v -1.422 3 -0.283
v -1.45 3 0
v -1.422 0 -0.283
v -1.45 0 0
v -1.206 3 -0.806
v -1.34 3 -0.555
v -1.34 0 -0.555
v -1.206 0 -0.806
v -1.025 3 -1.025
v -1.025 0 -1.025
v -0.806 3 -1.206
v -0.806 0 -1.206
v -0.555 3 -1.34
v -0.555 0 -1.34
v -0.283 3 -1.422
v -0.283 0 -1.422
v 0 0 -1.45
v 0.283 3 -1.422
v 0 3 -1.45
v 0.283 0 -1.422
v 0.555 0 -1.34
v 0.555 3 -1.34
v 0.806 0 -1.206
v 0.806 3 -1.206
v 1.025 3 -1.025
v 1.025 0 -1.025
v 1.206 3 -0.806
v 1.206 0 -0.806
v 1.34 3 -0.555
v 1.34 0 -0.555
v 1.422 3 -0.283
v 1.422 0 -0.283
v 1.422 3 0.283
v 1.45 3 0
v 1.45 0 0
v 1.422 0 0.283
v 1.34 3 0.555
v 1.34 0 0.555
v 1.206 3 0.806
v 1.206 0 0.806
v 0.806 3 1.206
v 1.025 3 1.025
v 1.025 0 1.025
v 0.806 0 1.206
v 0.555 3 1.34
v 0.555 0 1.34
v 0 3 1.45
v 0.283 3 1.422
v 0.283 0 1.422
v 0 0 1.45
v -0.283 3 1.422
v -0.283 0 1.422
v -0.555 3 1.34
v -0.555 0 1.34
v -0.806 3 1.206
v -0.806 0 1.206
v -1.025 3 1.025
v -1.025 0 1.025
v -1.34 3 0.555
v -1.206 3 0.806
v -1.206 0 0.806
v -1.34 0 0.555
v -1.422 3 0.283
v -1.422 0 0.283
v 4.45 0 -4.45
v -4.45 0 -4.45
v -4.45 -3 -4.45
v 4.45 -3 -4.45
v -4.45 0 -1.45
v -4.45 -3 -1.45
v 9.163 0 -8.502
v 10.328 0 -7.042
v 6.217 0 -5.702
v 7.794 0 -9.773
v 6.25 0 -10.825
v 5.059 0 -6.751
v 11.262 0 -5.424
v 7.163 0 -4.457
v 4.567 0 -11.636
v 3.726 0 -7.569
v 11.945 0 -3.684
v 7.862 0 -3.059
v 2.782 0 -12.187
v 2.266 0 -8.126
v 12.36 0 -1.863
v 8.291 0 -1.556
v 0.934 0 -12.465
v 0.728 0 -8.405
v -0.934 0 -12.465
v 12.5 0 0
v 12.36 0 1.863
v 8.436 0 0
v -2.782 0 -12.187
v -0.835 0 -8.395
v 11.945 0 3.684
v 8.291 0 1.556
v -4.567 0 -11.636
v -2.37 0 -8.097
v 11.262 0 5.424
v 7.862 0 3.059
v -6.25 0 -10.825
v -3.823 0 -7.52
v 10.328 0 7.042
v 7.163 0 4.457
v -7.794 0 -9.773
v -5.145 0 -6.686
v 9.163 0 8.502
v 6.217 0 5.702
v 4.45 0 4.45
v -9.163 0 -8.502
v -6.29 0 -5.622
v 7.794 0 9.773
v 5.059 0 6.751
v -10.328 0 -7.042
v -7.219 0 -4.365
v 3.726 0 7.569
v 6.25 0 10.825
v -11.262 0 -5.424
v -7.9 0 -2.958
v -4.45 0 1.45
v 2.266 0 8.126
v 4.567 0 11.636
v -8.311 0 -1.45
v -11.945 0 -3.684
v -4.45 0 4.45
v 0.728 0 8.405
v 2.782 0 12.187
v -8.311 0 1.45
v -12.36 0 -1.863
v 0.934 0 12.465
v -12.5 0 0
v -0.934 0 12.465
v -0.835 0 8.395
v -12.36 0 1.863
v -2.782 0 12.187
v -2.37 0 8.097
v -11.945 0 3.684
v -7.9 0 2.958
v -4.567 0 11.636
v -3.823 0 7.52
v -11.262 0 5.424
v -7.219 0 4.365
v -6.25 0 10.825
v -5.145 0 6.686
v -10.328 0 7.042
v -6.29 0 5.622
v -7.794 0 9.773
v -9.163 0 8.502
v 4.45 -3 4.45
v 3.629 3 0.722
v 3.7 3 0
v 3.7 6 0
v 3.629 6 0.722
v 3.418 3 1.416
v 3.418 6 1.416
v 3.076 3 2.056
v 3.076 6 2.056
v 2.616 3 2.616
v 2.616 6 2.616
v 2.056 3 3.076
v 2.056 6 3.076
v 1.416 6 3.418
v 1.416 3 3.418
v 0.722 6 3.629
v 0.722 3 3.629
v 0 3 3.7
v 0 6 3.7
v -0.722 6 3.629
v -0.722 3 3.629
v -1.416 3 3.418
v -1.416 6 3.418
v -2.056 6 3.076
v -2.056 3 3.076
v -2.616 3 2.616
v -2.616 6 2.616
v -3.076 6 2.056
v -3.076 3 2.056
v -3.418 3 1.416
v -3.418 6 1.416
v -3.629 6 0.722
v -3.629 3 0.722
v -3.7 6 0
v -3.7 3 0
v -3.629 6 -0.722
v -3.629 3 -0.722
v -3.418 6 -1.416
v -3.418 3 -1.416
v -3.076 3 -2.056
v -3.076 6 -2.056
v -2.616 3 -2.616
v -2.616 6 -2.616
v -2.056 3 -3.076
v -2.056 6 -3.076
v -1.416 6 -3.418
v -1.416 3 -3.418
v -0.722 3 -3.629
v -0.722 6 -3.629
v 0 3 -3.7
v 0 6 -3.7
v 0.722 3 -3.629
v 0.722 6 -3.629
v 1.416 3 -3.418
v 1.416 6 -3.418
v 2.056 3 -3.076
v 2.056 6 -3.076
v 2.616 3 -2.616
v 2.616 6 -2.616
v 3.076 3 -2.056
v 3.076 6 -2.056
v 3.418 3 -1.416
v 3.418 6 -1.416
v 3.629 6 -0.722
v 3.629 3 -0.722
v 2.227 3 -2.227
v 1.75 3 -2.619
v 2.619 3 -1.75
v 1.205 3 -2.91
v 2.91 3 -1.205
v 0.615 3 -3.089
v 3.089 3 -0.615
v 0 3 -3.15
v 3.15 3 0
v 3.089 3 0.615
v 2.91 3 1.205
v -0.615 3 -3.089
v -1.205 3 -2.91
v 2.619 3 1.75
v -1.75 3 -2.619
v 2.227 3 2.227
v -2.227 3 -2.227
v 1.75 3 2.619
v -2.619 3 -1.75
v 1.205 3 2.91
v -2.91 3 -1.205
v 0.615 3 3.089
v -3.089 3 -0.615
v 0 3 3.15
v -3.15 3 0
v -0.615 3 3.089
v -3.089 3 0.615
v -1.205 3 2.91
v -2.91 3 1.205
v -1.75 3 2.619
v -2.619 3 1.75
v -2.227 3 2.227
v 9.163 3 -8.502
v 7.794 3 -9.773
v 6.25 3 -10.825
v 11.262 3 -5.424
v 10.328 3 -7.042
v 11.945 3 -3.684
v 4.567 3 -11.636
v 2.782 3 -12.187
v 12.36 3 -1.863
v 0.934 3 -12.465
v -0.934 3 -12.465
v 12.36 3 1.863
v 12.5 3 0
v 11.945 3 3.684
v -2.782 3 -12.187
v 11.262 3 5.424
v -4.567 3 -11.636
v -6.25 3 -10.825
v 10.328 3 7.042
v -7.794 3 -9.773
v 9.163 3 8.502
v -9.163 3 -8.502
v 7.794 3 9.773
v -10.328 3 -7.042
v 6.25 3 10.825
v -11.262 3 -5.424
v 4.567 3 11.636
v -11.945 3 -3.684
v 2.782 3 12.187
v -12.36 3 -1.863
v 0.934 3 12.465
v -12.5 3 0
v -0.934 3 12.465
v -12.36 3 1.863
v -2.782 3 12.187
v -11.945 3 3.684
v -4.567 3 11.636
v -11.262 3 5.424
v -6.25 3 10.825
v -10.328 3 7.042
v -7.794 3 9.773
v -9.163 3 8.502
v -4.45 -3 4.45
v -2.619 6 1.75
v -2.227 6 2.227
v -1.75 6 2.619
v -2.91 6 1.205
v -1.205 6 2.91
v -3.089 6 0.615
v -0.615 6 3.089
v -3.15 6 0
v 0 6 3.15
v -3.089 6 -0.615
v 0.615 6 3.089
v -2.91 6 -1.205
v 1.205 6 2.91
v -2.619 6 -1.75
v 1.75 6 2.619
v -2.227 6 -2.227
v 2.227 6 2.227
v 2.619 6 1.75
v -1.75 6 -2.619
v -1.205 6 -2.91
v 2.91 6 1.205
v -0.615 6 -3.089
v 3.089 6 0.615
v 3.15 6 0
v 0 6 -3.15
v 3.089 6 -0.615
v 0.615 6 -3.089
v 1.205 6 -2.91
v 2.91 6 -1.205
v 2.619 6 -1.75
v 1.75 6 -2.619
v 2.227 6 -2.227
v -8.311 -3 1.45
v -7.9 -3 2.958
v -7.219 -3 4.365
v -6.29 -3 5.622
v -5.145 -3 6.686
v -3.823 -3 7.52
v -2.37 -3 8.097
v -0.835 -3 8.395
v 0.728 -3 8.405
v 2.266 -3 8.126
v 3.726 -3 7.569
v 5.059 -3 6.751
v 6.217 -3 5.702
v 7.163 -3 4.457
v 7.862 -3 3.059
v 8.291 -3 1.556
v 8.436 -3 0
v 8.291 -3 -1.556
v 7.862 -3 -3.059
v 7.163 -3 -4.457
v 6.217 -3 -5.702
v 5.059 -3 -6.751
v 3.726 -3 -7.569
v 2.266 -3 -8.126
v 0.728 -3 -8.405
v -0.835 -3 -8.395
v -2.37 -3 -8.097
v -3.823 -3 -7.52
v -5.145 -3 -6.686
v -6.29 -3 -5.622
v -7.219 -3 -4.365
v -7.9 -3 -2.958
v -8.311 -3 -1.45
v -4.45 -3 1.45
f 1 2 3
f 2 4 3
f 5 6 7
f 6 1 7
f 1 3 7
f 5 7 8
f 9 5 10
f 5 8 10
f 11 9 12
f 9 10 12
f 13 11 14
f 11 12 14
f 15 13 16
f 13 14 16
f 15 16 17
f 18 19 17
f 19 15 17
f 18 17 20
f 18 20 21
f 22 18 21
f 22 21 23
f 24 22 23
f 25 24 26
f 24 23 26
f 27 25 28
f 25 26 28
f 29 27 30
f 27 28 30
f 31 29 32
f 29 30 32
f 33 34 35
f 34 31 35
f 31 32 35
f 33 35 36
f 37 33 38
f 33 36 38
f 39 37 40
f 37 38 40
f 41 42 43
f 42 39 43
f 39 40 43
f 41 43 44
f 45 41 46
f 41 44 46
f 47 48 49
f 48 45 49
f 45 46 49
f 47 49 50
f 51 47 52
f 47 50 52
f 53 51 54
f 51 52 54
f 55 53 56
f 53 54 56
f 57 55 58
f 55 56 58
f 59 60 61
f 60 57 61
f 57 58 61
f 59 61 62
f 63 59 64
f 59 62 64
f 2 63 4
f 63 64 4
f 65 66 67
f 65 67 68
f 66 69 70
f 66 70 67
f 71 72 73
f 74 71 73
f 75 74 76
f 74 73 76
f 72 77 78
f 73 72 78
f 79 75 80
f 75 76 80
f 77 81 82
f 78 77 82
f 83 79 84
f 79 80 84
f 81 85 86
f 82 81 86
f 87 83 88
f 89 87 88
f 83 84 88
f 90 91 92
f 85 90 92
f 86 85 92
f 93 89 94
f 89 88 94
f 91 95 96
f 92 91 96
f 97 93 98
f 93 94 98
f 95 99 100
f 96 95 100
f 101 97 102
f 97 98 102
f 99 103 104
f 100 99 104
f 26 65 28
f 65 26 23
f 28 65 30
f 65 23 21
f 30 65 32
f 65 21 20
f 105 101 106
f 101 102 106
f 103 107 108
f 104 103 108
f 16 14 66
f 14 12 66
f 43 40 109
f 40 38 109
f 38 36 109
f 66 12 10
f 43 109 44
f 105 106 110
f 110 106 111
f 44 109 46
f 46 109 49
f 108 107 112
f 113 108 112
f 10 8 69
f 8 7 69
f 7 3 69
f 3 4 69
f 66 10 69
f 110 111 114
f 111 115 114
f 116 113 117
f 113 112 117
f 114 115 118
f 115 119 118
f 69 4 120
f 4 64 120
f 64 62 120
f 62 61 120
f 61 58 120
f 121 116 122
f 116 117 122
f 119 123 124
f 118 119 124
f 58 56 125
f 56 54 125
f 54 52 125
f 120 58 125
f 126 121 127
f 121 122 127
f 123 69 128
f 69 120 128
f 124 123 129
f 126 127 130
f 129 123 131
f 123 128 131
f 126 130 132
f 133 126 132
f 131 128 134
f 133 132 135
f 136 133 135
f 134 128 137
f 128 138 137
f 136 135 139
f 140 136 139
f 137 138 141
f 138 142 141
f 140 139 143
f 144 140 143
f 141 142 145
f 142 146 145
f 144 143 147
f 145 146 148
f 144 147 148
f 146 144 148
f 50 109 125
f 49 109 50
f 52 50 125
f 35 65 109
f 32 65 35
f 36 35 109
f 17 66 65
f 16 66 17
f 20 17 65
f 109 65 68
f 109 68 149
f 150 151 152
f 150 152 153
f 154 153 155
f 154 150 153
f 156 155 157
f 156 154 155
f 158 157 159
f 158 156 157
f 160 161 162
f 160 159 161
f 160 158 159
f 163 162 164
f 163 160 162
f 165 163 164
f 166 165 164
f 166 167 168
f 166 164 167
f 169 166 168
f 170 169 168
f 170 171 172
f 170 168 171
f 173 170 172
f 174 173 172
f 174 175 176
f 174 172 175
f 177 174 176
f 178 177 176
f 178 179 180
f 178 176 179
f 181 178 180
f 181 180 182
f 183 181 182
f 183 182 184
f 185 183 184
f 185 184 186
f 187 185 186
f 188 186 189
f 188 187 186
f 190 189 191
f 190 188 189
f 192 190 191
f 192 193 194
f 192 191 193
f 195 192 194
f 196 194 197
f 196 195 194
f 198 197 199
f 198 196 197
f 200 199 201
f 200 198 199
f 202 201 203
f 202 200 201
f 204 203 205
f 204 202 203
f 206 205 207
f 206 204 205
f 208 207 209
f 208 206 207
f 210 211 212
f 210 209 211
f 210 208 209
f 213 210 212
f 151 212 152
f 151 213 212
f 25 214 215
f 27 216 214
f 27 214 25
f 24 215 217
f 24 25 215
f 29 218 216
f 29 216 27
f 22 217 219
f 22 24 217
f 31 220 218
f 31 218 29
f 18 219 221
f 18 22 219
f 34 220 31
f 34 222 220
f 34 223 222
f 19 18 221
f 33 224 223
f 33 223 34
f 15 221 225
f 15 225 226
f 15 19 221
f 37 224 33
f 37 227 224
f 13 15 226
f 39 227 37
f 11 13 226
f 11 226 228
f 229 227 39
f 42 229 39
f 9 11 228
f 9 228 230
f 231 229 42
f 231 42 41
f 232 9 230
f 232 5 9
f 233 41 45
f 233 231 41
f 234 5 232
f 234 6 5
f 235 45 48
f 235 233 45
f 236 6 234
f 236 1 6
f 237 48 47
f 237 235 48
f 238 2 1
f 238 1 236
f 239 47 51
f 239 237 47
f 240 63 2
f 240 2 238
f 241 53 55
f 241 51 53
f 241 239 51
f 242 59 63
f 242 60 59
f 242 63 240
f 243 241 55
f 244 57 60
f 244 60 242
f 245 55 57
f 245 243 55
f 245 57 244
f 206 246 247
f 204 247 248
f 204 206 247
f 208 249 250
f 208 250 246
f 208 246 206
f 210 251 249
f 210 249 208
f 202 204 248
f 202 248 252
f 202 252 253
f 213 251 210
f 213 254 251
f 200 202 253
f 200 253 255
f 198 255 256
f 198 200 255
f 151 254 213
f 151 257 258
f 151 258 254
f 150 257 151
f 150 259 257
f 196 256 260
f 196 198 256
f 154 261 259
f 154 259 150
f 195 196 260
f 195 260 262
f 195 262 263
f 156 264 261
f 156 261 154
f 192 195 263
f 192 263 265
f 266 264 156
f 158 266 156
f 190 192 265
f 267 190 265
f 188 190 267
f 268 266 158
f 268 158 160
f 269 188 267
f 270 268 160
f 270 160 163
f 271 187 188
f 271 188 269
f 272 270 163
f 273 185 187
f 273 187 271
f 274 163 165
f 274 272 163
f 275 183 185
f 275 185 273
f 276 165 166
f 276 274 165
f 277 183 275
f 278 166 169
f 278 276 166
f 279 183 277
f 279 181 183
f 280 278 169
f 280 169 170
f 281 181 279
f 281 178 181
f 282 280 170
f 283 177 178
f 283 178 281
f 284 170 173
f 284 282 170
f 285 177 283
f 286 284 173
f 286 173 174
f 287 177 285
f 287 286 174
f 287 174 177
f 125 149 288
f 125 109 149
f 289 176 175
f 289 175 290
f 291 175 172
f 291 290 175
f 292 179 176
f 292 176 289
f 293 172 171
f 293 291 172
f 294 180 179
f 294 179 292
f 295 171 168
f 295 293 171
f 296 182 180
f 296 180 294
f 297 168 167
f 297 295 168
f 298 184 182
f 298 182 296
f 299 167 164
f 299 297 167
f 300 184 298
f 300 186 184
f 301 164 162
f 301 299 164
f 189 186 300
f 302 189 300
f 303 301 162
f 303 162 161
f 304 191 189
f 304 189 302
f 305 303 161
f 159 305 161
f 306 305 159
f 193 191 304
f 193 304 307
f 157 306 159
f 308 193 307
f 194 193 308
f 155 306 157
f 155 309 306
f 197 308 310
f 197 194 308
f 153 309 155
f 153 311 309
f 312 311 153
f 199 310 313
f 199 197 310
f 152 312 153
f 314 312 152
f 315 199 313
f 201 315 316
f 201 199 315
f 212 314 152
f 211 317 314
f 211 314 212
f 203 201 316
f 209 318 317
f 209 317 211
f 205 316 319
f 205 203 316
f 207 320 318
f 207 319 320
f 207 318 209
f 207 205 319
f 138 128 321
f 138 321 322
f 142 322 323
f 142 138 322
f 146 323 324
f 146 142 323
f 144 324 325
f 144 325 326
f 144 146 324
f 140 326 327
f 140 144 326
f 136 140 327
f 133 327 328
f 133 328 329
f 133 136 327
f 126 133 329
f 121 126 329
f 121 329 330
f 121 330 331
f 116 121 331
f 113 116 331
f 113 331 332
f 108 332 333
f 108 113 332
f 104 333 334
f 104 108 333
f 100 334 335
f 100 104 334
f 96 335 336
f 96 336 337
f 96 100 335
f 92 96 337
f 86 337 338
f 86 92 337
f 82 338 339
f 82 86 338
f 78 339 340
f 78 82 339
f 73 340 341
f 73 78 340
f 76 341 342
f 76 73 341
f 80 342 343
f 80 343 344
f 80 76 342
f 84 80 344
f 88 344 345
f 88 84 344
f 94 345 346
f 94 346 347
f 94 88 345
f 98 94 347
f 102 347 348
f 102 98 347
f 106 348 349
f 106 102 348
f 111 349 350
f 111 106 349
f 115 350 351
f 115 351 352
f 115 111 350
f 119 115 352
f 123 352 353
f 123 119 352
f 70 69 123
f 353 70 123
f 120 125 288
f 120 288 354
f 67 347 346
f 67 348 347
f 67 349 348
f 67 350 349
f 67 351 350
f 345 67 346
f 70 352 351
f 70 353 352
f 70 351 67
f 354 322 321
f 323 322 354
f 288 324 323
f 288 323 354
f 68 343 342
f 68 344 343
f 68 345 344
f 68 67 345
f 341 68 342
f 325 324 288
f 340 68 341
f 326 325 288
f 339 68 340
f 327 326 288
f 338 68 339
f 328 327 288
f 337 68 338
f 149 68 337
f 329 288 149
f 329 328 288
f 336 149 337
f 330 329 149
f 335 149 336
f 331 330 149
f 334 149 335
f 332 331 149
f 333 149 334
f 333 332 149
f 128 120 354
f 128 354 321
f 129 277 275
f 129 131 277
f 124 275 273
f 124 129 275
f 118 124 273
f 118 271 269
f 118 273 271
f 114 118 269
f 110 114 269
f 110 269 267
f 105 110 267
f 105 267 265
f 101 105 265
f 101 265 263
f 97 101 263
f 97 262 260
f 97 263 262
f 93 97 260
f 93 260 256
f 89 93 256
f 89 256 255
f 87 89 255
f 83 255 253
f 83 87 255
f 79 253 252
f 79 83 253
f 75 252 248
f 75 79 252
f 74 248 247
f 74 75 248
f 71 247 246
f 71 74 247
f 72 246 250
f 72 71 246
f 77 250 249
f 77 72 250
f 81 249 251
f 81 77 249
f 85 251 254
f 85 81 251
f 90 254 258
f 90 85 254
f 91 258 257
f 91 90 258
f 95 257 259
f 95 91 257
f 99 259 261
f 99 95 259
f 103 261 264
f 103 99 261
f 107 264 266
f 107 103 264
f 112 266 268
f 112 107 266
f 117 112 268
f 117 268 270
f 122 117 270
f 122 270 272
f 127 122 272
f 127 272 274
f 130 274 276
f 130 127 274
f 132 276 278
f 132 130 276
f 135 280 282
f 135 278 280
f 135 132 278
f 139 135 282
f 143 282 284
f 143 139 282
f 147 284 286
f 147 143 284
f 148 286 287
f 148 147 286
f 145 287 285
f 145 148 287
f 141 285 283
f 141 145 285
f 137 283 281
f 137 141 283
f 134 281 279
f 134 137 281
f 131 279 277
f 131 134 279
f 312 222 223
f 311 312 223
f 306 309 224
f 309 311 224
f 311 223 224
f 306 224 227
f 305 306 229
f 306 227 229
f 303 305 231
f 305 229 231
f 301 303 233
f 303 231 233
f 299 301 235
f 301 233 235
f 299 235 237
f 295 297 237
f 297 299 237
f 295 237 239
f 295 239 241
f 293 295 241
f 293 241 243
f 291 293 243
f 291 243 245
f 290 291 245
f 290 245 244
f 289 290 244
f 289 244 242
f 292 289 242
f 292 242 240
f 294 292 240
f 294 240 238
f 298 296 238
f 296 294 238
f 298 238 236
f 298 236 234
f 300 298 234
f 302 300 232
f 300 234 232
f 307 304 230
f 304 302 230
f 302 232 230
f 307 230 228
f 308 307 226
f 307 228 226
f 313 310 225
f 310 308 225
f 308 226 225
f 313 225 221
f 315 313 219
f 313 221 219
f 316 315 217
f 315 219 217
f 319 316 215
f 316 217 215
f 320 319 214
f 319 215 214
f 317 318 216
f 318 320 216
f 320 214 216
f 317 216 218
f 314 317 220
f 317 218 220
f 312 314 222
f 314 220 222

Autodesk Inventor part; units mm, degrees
ref_plane "YZ Plane" through (0, 0, 0) normal (1, 0, 0) x (0, 1, 0)
ref_plane "XZ Plane" through (0, 0, 0) normal (0, 1, 0) x (-1, 0, 0)
ref_plane "XY Plane" through (0, 0, 0) normal (0, 0, 1) x (1, 0, 0)
sketch "Sketch1" plane through (0, 0, 0) normal (0, 1, 0) x (-1, 0, 0)
  circle A0 centre (0, 0) radius 12.5
  circle A1 centre (0, 0) radius 1.45
  dimension "d0" = 25
  dimension "d1" = 2.9
extrude "Extrusion1" add sketch "Sketch1" along normal blind 3
sketch "Sketch2" plane through (0, 3, 0) normal (0, 1, 0) x (1, 0, 0)
  circle A0 centre (0, 0) radius 1.45 projected
  circle A1 centre (0, 0) radius 3.15
  circle A2 centre (0, 0) radius 3.7
  dimension "d4" = 6.3
  dimension "d5" = 7.4
extrude "Extrusion2" add sketch "Sketch2" along normal blind 3 contours A2
sketch "Sketch3" plane through (0, 0, 0) normal (0, -1, 0) x (1, 0, 0)
  circle A0 centre (0, 0) radius 1.45 projected
  line L0 (-4.45, -4.45) -> (4.45, -4.45)
  line L1 (4.45, -4.45) -> (4.45, 4.45)
  line L2 (4.45, 4.45) -> (-4.45, 4.45)
  line L3 (-4.45, 4.45) -> (-4.45, -4.45)
  line L4 (-4.45, -4.45) -> (4.45, 4.45) construction
  line L5 (4.45, -4.45) -> (-4.45, 4.45) construction
  circle A1 centre (0, 0) radius 8.4362
  line L6 (-4.45, 1.45) -> (-8.3107, 1.45)
  line L7 (-4.45, -1.45) -> (-8.3107, -1.45)
  dimension "d8" = 8.9
  dimension "d9" = 8.9
extrude "Extrusion3" add sketch "Sketch3" along normal blind 3 contours L0 L1 L2 L3 L6 A1 L7
properties part number "30_CUBE_openSIM_Laser_FPC_mount"
